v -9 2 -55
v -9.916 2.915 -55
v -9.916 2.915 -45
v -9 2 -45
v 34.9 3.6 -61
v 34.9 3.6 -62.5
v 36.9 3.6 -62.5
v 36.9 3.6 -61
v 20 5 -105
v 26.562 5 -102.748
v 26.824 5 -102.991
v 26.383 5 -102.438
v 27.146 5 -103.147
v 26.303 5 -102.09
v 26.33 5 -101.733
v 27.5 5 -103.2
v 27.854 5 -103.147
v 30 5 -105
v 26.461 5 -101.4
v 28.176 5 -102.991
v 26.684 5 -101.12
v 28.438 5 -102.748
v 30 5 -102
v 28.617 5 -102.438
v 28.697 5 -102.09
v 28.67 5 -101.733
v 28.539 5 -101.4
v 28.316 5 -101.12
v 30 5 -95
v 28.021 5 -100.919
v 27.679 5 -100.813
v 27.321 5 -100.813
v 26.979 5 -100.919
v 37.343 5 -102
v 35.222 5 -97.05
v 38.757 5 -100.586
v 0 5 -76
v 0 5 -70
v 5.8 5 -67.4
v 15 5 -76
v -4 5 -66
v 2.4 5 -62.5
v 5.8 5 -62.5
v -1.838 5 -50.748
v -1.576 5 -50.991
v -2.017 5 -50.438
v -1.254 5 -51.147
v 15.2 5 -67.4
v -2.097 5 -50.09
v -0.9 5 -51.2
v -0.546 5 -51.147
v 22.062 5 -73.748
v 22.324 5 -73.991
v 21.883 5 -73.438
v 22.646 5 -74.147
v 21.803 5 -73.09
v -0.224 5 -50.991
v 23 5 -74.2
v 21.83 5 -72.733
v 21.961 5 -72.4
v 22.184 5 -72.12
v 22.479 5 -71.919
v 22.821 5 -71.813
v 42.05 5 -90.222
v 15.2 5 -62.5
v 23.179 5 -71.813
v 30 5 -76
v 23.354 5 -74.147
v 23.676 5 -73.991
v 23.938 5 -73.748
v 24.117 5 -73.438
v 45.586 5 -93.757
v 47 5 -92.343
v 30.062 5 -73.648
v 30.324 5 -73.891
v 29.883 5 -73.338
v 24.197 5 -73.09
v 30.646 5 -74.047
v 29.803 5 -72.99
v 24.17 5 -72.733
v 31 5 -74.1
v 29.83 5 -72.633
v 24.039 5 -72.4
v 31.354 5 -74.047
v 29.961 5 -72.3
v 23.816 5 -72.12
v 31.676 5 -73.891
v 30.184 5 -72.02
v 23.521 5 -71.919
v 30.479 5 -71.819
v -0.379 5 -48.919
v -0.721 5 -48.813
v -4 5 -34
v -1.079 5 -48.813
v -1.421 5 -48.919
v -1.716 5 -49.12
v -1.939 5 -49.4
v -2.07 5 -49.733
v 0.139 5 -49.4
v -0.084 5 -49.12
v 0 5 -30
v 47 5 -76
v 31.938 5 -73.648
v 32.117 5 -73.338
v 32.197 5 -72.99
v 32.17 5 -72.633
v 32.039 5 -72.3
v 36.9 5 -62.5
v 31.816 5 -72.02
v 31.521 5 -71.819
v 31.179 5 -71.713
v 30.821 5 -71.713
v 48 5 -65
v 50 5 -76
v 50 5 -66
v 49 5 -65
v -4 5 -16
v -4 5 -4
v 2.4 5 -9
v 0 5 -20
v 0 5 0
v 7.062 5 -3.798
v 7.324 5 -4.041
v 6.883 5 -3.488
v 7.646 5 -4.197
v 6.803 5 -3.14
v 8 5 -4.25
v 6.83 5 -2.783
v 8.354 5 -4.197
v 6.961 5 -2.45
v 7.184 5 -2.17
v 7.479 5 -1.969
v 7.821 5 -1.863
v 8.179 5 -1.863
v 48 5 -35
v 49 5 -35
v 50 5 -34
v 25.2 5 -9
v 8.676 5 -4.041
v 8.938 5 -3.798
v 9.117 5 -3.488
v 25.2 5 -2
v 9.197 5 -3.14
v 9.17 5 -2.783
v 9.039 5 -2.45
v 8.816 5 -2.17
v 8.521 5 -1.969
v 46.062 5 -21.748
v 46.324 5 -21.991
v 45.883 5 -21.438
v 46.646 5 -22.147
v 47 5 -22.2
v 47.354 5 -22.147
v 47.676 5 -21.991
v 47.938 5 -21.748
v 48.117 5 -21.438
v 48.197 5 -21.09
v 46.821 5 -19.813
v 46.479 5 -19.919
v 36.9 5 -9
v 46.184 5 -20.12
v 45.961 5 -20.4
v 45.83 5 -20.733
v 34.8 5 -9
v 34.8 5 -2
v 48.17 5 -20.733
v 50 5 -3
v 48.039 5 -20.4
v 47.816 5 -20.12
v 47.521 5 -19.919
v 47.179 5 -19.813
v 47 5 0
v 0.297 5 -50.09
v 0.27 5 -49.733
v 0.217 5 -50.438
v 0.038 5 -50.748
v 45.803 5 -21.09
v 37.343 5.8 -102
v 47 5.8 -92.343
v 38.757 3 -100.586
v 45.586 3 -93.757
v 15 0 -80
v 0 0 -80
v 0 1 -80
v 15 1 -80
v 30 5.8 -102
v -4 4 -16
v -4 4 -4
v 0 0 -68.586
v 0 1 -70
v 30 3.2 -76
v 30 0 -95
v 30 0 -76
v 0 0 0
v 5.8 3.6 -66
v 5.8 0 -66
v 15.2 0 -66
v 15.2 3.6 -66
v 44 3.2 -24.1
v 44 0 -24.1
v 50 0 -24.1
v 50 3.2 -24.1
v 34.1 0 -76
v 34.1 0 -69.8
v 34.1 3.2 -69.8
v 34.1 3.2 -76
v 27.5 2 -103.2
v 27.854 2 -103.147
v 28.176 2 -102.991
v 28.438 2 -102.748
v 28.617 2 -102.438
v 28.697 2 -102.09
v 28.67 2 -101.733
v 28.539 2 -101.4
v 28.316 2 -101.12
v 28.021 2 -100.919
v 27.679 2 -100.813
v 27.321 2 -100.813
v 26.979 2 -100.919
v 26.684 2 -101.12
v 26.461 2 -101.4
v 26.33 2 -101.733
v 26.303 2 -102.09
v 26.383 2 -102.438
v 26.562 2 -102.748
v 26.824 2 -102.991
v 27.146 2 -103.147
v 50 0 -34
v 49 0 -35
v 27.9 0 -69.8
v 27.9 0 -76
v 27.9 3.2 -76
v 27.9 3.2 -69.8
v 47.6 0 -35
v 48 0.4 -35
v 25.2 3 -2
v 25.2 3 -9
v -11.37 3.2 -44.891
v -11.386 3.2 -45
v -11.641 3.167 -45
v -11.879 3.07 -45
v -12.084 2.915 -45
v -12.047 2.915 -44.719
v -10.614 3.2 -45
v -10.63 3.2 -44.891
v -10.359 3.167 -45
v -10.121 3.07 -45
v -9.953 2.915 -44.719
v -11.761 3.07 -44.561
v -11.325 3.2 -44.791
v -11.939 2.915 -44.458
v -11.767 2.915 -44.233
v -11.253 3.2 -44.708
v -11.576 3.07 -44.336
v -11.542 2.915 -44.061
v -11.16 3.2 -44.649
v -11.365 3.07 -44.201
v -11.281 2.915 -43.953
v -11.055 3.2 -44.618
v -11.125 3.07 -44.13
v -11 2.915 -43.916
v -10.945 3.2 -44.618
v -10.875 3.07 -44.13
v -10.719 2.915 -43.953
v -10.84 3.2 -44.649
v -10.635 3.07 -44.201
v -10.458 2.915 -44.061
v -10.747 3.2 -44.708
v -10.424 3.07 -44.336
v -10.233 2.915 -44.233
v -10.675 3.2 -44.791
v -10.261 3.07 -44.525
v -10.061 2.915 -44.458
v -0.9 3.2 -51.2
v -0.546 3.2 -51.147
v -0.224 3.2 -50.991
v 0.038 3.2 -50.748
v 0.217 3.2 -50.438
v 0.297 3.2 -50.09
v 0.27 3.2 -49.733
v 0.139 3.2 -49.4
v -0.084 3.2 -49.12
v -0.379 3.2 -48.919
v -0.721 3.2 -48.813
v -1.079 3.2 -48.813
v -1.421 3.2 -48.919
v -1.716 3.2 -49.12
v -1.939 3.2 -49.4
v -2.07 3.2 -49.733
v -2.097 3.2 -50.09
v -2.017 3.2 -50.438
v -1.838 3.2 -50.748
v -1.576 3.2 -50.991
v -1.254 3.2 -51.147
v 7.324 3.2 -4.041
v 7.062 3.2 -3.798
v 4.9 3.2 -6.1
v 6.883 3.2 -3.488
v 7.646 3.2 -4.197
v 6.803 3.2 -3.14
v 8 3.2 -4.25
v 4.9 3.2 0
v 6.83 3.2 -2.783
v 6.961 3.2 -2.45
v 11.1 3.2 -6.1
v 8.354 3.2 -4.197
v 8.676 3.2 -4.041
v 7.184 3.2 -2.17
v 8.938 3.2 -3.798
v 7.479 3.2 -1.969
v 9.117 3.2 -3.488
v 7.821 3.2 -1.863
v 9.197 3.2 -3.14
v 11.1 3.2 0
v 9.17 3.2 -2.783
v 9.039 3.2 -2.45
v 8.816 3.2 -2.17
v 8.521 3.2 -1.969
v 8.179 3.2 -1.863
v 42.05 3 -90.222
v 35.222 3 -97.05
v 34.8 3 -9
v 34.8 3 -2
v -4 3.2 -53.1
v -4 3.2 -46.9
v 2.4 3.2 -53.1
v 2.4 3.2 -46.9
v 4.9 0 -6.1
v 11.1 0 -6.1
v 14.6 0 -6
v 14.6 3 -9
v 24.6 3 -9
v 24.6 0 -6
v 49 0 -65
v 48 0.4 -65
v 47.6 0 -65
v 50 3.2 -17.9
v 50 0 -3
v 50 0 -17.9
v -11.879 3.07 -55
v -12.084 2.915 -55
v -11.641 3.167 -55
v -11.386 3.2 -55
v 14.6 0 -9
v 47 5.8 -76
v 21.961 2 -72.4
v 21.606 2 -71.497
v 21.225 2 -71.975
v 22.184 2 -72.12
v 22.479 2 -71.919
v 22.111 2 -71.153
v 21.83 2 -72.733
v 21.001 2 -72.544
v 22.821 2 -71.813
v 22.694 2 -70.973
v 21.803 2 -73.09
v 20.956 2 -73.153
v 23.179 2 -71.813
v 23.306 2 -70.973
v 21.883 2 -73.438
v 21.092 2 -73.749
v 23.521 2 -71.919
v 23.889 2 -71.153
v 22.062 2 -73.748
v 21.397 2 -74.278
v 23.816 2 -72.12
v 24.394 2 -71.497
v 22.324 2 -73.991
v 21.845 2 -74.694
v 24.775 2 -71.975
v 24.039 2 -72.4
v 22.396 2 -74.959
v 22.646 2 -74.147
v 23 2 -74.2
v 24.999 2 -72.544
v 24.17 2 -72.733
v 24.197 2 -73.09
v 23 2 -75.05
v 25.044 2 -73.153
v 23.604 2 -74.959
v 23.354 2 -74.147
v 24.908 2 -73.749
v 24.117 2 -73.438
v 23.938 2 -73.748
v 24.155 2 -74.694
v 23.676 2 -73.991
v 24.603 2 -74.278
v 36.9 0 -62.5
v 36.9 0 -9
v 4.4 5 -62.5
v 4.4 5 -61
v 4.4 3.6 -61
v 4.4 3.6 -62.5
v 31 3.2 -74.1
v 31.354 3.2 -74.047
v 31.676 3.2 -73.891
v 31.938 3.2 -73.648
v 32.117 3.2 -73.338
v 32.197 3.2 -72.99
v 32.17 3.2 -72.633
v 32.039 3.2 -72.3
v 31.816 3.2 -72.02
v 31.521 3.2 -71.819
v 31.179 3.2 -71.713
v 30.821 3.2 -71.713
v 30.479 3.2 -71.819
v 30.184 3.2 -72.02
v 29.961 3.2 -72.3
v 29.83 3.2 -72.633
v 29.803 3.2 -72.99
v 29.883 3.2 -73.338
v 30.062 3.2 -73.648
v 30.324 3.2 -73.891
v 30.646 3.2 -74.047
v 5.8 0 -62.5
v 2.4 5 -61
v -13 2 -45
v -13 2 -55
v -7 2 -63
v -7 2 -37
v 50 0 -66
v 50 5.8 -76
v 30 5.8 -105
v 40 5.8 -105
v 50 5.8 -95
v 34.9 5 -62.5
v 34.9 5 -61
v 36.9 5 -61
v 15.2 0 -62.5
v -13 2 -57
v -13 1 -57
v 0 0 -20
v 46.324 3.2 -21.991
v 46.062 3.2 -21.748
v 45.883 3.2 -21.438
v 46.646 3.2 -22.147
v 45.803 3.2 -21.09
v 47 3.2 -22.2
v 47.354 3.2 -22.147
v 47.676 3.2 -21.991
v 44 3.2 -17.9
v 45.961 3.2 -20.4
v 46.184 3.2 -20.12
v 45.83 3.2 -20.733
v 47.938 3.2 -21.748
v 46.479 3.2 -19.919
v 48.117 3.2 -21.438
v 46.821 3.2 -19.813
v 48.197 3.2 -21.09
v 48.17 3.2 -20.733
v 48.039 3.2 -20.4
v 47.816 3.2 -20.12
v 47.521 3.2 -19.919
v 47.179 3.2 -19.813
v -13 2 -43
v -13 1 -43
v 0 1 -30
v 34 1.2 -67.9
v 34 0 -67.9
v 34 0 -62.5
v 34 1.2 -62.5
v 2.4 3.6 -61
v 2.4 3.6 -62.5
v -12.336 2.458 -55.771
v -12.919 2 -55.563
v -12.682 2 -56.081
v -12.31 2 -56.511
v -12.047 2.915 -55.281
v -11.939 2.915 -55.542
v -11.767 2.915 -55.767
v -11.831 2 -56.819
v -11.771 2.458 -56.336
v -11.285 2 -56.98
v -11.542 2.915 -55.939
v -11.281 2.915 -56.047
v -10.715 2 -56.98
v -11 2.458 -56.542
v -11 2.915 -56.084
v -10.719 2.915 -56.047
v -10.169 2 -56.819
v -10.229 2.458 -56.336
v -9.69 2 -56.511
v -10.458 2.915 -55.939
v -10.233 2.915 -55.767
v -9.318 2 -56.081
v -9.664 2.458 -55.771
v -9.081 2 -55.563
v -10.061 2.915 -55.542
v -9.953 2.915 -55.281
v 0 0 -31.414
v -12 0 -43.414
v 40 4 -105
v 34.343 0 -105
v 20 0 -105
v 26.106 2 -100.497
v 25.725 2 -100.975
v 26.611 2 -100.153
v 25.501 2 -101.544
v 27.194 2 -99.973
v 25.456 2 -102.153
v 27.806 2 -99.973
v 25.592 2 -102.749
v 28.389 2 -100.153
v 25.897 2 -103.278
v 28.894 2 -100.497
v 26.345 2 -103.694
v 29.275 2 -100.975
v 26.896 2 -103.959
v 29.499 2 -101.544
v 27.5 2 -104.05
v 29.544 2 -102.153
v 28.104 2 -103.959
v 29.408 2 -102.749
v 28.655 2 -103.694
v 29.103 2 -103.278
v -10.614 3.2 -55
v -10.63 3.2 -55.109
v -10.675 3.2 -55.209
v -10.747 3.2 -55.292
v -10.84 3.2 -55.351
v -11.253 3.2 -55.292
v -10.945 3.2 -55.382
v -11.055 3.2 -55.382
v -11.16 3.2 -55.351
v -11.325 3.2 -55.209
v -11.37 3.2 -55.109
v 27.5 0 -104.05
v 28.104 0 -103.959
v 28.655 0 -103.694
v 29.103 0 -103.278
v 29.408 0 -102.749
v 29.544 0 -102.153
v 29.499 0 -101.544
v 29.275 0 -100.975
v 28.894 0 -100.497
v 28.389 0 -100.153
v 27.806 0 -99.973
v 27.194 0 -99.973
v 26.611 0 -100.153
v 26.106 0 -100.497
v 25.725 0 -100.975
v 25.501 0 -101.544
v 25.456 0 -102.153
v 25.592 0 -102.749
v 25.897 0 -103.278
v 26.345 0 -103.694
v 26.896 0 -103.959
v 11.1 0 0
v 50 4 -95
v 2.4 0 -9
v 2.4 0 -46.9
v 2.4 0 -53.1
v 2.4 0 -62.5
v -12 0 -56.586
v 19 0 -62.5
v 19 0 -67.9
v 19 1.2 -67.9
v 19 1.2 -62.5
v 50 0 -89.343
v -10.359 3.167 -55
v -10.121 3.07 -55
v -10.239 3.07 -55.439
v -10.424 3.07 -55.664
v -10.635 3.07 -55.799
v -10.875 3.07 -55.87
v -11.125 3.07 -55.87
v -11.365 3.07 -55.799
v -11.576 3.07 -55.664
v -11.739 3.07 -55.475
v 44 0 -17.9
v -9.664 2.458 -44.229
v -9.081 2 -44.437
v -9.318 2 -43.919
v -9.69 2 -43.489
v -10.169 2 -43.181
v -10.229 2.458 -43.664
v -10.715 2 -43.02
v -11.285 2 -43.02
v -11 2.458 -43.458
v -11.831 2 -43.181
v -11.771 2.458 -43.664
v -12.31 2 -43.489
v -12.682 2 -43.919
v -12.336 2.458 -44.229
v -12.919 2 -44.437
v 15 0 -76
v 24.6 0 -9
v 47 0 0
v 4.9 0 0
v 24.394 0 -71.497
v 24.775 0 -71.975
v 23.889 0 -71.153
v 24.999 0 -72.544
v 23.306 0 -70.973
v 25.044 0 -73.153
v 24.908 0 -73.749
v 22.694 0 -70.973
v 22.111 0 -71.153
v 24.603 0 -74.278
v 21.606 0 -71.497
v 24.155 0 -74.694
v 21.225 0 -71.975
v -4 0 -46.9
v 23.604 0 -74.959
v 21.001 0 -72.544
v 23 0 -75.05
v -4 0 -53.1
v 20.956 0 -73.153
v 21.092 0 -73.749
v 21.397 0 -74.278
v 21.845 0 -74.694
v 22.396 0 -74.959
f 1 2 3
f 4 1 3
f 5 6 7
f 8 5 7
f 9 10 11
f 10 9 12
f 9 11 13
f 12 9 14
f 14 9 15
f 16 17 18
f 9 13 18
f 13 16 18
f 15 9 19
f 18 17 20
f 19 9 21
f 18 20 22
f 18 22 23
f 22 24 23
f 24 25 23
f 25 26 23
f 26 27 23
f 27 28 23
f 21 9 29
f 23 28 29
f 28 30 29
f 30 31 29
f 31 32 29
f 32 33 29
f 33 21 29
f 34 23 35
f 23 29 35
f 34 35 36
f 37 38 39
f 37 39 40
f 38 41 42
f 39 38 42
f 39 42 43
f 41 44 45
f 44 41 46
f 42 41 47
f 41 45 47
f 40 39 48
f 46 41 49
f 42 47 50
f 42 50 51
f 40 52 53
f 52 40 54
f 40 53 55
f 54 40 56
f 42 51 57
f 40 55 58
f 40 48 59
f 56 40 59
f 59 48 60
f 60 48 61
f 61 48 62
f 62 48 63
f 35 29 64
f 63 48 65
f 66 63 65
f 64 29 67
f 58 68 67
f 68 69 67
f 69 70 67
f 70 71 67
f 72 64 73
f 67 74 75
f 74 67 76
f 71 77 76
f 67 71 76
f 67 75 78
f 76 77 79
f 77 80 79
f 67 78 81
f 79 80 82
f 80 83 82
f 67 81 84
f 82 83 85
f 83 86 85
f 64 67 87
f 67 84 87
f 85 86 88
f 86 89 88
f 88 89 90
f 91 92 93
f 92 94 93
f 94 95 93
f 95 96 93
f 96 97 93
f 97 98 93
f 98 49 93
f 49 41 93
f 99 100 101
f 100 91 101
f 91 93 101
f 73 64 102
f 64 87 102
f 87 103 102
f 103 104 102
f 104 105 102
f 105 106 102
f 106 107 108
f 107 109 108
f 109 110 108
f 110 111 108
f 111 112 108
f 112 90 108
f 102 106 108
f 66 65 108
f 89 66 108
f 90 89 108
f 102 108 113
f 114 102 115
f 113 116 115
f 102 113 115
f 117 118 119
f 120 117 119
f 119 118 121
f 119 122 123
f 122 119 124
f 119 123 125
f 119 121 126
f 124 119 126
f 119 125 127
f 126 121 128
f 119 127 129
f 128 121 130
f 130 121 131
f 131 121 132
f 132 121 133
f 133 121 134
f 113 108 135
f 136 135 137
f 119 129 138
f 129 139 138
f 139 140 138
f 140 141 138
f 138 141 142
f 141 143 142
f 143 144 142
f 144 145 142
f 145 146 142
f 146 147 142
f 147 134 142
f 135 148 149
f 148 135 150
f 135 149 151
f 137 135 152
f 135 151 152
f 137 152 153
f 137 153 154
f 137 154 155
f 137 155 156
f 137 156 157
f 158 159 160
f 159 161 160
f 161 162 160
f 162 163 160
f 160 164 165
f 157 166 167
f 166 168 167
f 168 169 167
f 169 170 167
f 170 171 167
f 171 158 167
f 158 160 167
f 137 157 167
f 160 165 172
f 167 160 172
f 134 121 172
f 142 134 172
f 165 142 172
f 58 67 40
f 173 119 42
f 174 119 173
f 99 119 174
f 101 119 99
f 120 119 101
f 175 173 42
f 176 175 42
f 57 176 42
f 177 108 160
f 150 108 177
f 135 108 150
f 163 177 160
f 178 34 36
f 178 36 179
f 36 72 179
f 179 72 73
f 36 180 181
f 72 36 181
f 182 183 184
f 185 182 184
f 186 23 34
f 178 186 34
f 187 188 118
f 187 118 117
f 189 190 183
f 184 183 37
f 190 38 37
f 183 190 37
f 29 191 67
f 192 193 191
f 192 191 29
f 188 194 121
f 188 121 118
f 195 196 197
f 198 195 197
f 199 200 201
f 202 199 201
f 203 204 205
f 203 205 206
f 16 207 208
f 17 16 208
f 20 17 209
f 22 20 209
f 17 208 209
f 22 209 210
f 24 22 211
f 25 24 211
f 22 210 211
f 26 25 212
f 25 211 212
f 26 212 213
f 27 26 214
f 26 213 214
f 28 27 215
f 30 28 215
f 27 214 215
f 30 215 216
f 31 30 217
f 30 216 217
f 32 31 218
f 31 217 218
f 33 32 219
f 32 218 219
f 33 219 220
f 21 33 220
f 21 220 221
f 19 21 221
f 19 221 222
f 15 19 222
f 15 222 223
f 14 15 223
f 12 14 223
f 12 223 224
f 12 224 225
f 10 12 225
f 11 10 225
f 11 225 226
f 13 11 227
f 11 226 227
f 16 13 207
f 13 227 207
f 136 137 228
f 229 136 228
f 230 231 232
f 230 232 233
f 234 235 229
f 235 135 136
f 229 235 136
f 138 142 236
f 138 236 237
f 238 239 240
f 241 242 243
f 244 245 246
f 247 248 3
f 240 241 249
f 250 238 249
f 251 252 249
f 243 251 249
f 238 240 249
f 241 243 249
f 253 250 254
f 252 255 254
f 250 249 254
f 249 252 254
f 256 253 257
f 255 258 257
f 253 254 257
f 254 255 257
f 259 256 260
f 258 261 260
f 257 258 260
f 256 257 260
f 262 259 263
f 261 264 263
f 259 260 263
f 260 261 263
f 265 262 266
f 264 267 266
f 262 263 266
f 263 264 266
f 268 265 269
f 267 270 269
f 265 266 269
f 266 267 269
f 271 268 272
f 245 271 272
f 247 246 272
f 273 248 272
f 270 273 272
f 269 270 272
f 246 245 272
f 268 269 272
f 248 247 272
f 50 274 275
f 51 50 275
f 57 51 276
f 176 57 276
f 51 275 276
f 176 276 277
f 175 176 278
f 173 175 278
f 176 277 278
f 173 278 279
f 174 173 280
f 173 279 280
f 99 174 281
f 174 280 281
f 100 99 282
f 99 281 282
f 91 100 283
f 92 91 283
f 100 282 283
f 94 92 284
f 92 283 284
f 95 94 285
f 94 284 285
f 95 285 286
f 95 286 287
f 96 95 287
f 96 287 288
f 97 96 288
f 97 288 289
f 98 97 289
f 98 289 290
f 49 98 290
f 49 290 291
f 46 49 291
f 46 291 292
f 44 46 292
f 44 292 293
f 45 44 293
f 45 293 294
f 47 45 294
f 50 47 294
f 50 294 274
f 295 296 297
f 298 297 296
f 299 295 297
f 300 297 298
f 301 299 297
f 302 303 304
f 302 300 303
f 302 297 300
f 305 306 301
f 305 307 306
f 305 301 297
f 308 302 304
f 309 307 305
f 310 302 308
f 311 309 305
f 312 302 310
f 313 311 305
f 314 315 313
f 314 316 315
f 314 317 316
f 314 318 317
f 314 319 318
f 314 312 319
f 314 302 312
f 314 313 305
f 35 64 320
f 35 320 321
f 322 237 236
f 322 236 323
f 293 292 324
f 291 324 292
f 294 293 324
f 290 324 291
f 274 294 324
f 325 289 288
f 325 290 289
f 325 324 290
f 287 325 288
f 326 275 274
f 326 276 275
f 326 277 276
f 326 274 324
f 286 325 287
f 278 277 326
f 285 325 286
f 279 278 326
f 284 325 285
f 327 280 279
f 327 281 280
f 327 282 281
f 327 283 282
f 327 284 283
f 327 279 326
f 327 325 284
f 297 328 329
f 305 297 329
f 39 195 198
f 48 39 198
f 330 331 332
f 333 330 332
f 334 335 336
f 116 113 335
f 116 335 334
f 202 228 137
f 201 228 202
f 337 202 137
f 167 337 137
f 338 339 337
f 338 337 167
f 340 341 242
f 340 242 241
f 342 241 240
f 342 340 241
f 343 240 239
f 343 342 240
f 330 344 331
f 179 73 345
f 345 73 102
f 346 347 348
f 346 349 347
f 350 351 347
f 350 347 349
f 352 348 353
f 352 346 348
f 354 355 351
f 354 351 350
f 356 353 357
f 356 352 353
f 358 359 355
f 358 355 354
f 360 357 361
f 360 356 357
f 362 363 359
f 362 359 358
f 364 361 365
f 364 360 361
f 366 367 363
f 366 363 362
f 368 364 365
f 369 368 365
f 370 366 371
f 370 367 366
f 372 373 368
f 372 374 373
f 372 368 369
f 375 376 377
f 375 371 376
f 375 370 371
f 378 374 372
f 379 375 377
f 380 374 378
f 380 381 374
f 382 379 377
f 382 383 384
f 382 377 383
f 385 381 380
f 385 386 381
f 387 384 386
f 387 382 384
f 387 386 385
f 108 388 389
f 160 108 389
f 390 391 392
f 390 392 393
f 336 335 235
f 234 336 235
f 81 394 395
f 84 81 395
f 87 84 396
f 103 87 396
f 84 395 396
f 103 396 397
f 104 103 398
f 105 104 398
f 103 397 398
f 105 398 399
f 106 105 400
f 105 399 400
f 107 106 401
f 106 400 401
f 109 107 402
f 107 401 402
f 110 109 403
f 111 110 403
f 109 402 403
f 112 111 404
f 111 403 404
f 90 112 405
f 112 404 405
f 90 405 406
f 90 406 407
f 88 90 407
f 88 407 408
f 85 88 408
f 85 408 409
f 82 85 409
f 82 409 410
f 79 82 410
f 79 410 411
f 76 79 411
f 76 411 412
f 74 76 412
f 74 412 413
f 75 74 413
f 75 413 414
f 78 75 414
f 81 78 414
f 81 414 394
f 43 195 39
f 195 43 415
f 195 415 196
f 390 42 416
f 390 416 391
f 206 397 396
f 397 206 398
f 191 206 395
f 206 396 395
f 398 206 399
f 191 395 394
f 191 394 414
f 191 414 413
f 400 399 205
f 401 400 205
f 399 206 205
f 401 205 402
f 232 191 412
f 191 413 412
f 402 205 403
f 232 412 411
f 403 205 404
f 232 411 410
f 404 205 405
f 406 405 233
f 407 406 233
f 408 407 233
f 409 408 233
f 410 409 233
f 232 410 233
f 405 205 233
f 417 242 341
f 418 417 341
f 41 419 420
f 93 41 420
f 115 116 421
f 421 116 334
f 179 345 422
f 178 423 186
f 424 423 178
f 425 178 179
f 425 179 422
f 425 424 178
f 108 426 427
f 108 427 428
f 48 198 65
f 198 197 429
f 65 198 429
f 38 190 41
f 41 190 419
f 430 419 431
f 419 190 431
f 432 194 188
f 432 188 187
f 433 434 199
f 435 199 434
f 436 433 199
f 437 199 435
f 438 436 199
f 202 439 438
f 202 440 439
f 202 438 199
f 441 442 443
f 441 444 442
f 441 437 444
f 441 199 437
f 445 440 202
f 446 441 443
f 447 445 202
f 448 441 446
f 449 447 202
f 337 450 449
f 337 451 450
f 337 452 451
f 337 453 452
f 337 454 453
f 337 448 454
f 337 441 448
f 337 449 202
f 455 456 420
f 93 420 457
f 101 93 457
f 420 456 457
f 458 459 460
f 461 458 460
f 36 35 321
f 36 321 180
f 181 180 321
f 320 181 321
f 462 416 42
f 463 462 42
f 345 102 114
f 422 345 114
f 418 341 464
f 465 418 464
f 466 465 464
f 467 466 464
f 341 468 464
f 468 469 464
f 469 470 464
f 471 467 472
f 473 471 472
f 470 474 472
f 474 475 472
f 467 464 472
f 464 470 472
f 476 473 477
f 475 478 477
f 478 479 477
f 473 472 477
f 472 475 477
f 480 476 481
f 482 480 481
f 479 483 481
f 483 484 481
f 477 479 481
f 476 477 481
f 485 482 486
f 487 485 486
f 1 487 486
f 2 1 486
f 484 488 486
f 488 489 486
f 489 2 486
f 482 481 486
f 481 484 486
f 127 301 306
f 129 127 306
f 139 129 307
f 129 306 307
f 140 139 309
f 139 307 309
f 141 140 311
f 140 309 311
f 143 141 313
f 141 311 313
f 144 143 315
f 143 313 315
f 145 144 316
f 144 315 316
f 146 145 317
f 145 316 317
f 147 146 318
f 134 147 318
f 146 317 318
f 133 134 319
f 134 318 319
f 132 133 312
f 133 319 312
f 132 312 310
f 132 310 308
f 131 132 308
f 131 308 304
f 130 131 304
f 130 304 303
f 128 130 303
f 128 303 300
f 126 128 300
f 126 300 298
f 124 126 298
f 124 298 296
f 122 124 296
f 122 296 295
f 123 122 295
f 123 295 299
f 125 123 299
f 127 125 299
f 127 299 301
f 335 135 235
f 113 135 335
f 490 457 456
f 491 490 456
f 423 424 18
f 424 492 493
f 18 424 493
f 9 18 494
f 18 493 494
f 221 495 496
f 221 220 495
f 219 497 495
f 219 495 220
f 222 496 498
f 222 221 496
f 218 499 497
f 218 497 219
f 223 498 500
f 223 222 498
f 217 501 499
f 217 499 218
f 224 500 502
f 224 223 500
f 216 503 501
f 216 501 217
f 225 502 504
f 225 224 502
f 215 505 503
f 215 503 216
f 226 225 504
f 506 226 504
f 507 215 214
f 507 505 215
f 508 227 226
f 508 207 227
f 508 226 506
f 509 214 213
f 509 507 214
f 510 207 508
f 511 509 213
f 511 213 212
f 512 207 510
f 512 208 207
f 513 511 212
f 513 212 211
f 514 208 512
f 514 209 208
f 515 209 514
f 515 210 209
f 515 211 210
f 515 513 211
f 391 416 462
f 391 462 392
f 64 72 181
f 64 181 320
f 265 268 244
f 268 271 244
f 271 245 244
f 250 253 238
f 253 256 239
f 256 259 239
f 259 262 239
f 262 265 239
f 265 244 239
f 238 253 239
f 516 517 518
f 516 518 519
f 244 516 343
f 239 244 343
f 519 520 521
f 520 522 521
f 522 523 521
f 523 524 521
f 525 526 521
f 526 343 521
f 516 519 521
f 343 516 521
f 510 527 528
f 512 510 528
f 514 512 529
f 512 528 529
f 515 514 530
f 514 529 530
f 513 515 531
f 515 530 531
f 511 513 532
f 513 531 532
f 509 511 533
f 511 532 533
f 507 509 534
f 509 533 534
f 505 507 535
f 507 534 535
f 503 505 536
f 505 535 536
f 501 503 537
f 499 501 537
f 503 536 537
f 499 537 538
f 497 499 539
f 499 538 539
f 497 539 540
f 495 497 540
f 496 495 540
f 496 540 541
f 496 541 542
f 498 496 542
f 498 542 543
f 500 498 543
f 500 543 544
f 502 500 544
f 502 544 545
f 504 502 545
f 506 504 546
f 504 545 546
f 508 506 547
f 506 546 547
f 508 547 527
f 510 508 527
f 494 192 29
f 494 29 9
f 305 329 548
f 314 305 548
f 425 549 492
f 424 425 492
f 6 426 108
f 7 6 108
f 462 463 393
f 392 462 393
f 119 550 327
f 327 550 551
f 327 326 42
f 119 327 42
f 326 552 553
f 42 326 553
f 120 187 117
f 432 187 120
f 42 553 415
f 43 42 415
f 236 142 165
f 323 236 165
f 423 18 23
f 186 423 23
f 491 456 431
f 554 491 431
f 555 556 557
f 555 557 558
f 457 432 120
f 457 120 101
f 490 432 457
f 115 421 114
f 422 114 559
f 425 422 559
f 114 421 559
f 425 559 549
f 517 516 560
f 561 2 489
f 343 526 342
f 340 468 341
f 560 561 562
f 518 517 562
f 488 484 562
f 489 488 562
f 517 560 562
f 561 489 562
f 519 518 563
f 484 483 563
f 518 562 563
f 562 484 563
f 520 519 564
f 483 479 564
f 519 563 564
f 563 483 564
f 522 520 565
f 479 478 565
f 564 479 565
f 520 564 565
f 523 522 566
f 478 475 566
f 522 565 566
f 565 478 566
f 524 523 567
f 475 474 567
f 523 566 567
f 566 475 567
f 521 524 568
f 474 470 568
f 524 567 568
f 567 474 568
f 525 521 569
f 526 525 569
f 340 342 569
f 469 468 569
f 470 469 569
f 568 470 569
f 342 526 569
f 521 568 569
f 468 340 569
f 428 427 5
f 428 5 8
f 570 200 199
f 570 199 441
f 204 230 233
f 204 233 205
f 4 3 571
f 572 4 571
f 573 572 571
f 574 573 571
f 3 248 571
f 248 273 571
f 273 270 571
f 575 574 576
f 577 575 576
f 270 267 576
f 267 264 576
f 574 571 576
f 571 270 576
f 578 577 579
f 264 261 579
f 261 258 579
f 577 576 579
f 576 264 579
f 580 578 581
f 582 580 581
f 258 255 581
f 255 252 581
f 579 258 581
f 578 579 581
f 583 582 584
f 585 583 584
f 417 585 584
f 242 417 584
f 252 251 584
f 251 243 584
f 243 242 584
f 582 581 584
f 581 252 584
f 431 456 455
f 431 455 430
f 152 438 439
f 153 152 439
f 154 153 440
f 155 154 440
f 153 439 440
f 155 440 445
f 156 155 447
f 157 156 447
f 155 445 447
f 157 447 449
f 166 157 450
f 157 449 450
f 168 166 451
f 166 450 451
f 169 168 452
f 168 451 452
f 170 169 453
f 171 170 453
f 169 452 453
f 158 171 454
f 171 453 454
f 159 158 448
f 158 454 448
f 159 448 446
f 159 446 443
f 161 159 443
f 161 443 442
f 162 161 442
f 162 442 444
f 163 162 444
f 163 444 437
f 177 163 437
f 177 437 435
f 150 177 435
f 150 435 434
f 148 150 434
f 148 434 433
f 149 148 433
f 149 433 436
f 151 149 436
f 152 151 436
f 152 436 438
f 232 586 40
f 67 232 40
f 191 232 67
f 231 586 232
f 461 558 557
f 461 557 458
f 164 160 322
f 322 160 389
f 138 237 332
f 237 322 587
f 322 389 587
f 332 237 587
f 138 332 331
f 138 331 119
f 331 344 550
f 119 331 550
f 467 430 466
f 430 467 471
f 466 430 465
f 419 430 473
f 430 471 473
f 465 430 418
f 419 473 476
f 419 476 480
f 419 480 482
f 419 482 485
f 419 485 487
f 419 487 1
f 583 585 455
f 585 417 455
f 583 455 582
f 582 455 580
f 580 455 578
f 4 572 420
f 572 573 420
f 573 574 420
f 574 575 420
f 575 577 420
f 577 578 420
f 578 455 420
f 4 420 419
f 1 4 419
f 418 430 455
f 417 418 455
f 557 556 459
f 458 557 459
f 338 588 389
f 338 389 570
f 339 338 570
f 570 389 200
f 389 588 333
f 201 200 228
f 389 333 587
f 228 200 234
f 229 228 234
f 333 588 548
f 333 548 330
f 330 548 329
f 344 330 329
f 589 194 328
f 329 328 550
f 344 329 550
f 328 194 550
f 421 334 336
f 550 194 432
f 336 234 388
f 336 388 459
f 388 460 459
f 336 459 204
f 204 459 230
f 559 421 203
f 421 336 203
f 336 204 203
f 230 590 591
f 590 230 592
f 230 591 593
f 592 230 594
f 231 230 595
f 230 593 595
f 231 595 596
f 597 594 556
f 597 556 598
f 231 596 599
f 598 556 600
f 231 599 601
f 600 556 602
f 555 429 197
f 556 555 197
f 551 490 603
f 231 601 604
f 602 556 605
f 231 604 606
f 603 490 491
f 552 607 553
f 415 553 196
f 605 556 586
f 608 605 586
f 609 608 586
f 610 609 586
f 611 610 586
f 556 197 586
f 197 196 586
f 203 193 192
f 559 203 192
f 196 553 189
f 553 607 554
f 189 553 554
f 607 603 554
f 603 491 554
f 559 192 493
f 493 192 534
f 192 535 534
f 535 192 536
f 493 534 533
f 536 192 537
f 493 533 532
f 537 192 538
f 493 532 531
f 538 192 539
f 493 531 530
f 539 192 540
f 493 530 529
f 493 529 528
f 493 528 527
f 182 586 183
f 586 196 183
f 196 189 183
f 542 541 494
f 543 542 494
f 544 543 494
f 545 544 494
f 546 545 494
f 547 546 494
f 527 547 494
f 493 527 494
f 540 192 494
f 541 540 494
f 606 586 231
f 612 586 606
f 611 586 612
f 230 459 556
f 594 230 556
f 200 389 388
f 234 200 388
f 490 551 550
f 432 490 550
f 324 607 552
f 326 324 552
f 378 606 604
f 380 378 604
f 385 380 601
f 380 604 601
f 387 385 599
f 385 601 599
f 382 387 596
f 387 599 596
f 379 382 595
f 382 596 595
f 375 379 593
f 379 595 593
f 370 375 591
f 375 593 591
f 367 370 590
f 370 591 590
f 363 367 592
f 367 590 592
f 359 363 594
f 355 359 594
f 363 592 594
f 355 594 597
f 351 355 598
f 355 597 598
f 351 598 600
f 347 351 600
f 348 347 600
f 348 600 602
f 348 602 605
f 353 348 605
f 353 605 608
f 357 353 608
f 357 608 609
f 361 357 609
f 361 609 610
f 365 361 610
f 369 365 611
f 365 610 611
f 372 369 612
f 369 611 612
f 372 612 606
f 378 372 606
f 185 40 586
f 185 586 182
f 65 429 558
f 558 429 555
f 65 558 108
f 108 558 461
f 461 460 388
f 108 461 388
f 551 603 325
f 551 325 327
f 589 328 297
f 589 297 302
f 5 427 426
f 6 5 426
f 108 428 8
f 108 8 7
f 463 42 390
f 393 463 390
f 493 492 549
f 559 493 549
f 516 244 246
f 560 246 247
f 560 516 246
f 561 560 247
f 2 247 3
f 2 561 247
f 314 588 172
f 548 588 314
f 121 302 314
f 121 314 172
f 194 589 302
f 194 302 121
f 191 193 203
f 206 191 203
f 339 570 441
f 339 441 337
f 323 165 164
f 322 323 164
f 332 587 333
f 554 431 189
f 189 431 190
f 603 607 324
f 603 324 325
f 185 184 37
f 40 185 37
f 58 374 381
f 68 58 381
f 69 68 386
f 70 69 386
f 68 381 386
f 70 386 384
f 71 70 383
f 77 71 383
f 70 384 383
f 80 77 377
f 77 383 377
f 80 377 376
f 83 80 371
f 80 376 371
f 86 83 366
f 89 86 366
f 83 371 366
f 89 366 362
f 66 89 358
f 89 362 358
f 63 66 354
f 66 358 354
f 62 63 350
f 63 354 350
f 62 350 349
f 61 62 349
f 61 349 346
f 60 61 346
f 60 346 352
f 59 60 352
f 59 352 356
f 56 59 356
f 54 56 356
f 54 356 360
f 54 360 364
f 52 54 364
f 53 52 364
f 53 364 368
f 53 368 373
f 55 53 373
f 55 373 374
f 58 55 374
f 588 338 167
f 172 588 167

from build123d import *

# Parameters (mm, degrees)
EXTRUDE_1_DEPTH      = 5
CUT_EXTRUDE_1_DEPTH  = 5
CHAMFER_1_SIZE       = 1.4
SKETCH_3_W           = 2
SKETCH_3_H           = 1.5
EXTRUDE_2_DEPTH      = 1.4
EXTRUDE_2_2_DEPTH    = 1.4
CHAMFER_2_SIZE       = 4
EXTRUDE_4_DEPTH      = 2
EXTRUDE_5_DEPTH      = 3
CHAMFER_4_SIZE       = 3
EXTRUDE_6_DEPTH      = 5
CHAMFER_5_SIZE       = 4
SKETCH_9_R           = 2.05
CUT_EXTRUDE_2_DEPTH  = 2
SKETCH_10_R          = 1.2
CUT_EXTRUDE_3_DEPTH  = 3
CHAMFER_6_SIZE       = 1
CHAMFER_7_SIZE       = 3
SKETCH_11_W          = 2
SKETCH_11_H          = 30
CUT_EXTRUDE_4_DEPTH  = 117.404467268
SKETCH_12_W          = 6
SKETCH_12_H          = 6.2
SKETCH_12_W_2        = 6.2
SKETCH_12_H_2        = 6.1
SKETCH_12_W_3        = 6.4
CUT_EXTRUDE_5_DEPTH  = 3.2
SKETCH_12_4_R        = 1.2
CUT_EXTRUDE_6_DEPTH  = 117.404467268
SKETCH_13_W          = 9.6
SKETCH_13_H          = 7
CUT_EXTRUDE_7_DEPTH  = 2
SKETCH_14_W          = 10
SKETCH_14_H          = 3
CUT_EXTRUDE_8_DEPTH  = 3
CHAMFER_8_SIZE       = 3
EXTRUDE_7_DEPTH      = 15
CHAMFER_9_SIZE       = 1
SKETCH_16_W          = 15
SKETCH_16_H          = 5.4
CUT_EXTRUDE_9_DEPTH  = 1.2
EXTRUDE_8_DEPTH      = 1.2
CHAMFER_10_SIZE      = 1.2
FILLET_START         = -55.913222165
FILLET_1_DEPTH       = 11.82644433
FILLET_1_2_ANGLE     = 180
FILLET_1_3_ANGLE     = 180
SKETCH_18_R          = 1.2
CUT_EXTRUDE_10_DEPTH = 117.404467268
SKETCH_18_3_R        = 2.05
CUT_EXTRUDE_11_DEPTH = 2
EXTRUDE_3_DEPTH      = 0.8
CUT_EXTRUDE_12_DEPTH = 2
CHAMFER_11_SIZE      = 0.4


with BuildPart() as part:
    # 草图1 → 凸台-拉伸1 (new body)
    with BuildSketch(Plane(origin=(0, 0, 0), x_dir=(1, 0, 0), z_dir=(0, 1, 0))):
        Polygon((40, 105), (50, 95), (50, 0), (0, 0), (0, 76), (30, 76), (30, 95), (20, 105), align=None)
    extrude(amount=EXTRUDE_1_DEPTH)

    # 草图2 → 切除-拉伸1 (cut)
    with BuildSketch(Plane.XZ):
        Polygon((15.2, -62.5), (36.9, -62.5), (36.9, -9), (2.4, -9), (2.4, -62.5), (5.8, -62.5), (5.8, -66), (15.2, -66), align=None)
    extrude(amount=-CUT_EXTRUDE_1_DEPTH, mode=Mode.SUBTRACT)

    # 倒角1
    chamfer_1_edges = [part.edges().sort_by_distance(p)[0] for p in [
        (10.5, 5, -66),
    ]]
    chamfer(chamfer_1_edges, length=CHAMFER_1_SIZE)

    # 倒角2
    chamfer_2_edges = [part.edges().sort_by_distance(p)[0] for p in [
        (45, 0, -100),
    ]]
    chamfer(chamfer_2_edges, length=CHAMFER_2_SIZE)

    # 草图6 → 凸台-拉伸4 (add)
    with BuildSketch(Plane.XZ):
        Polygon((0, -70), (0, -30), (-13, -43), (-13, -57), align=None)
    extrude(amount=-EXTRUDE_4_DEPTH)

    # 草图7 → 凸台-拉伸5 (add)
    with BuildSketch(Plane(origin=(0, 2, 0), x_dir=(1, 0, 0), z_dir=(0, 1, 0))):
        Polygon((-4, 66), (-4, 34), (0, 30), (0, 70), align=None)
    extrude(amount=EXTRUDE_5_DEPTH)

    # 倒角4
    chamfer_4_edges = [part.edges().sort_by_distance(p)[0] for p in [
        (-4, 2, -50),
    ]]
    chamfer(chamfer_4_edges, length=CHAMFER_4_SIZE - 0.0001)  # a hair under: the kernel refuses the full size

    # 草图8 → 凸台-拉伸6 (add)
    with BuildSketch(Plane.XZ):
        Polygon((0, -20), (0, 0), (-4, -4), (-4, -16), align=None)
    extrude(amount=-EXTRUDE_6_DEPTH)

    # 倒角5
    chamfer_5_edges = [part.edges().sort_by_distance(p)[0] for p in [
        (-4, 0, -10),
    ]]
    chamfer(chamfer_5_edges, length=CHAMFER_5_SIZE)

    # 草图9 → 切除-拉伸2 (cut)
    with BuildSketch(Plane.XZ):
        with Locations(Location((27.5, -102, 0), (0, 0, 270))):
            Circle(SKETCH_9_R)
    extrude(amount=-CUT_EXTRUDE_2_DEPTH, mode=Mode.SUBTRACT)

    # 草图10 → 切除-拉伸3 (cut)
    with BuildSketch(Plane.XZ.offset(-2)):
        with Locations(Location((27.5, -102, 0), (0, 0, 270))):
            Circle(SKETCH_10_R)
    extrude(amount=-CUT_EXTRUDE_3_DEPTH, mode=Mode.SUBTRACT)

    # 倒角6
    chamfer_6_edges = [part.edges().sort_by_distance(p)[0] for p in [
        (-6.5, 0, -36.5),
        (-13, 0, -50),
        (-6.5, 0, -63.5),
    ]]
    chamfer(chamfer_6_edges, length=CHAMFER_6_SIZE)

    # 倒角7
    chamfer_7_edges = [part.edges().sort_by_distance(p)[0] for p in [
        (50, 2.5, 0),
    ]]
    chamfer(chamfer_7_edges, length=CHAMFER_7_SIZE)

    # 草图11 → 切除-拉伸4 (cut, through all)
    with BuildSketch(Plane(origin=(0, 5, 0), x_dir=(1, 0, 0), z_dir=(0, 1, 0))):
        with Locations((49, 50)):
            Rectangle(SKETCH_11_W, SKETCH_11_H)
    extrude(amount=-CUT_EXTRUDE_4_DEPTH, mode=Mode.SUBTRACT)

    # 草图12 → 切除-拉伸5 (cut)
    with BuildSketch(Plane.XZ):
        with Locations((47, -21)):
            Rectangle(SKETCH_12_W, SKETCH_12_H)
        with Locations((8, -3.05)):
            Rectangle(SKETCH_12_W_2, SKETCH_12_H_2)
        Polygon((27.9, -76), (27.9, -69.8), (34.1, -69.8), (34.1, -76), (30, -76), align=None)
        with Locations((-0.8, -50)):
            Rectangle(SKETCH_12_W_3, SKETCH_12_H)
    extrude(amount=-CUT_EXTRUDE_5_DEPTH, mode=Mode.SUBTRACT)

    # 草图12<4> → 切除-拉伸6 (cut, through all)
    with BuildSketch(Plane.XZ):
        with Locations(Location((8, -3.05, 0), (0, 0, 270))):
            Circle(SKETCH_12_4_R)
        with Locations(Location((47, -21, 0), (0, 0, 270))):
            Circle(SKETCH_12_4_R)
        with Locations(Location((31, -72.9, 0), (0, 0, 270))):
            Circle(SKETCH_12_4_R)
        with Locations(Location((-0.9, -50, 0), (0, 0, 270))):
            Circle(SKETCH_12_4_R)
    extrude(amount=-CUT_EXTRUDE_6_DEPTH, mode=Mode.SUBTRACT)

    # 草图13 → 切除-拉伸7 (cut)
    with BuildSketch(Plane(origin=(0, 5, 0), x_dir=(1, 0, 0), z_dir=(0, 1, 0))):
        with Locations((30.000080746, 5.5)):
            Rectangle(SKETCH_13_W, SKETCH_13_H)
    extrude(amount=-CUT_EXTRUDE_7_DEPTH, mode=Mode.SUBTRACT)

    # 草图14 → 切除-拉伸8 (cut)
    with BuildSketch(Plane.XZ):
        with Locations((19.6, -7.5)):
            Rectangle(SKETCH_14_W, SKETCH_14_H)
    extrude(amount=-CUT_EXTRUDE_8_DEPTH, mode=Mode.SUBTRACT)

    # 倒角8
    chamfer_8_edges = [part.edges().sort_by_distance(p)[0] for p in [
        (19.6, 3, -6),
    ]]
    chamfer(chamfer_8_edges, length=CHAMFER_8_SIZE - 0.0001)  # a hair under: the kernel refuses the full size

    # 草图15 → 凸台-拉伸7 (add)
    with BuildSketch(Plane.ZY):
        Polygon((-76, 5), (-76, 0), (-80, 0), (-80, 1), align=None)
    extrude(amount=-EXTRUDE_7_DEPTH)

    # 倒角9
    chamfer_9_edges = [part.edges().sort_by_distance(p)[0] for p in [
        (50, 2.5, -65),
        (50, 2.5, -35),
    ]]
    chamfer(chamfer_9_edges, length=CHAMFER_9_SIZE)

    # 草图16 → 切除-拉伸9 (cut)
    with BuildSketch(Plane.XZ):
        with Locations((26.5, -65.2)):
            Rectangle(SKETCH_16_W, SKETCH_16_H)
    extrude(amount=-CUT_EXTRUDE_9_DEPTH, mode=Mode.SUBTRACT)

    # 草图17 → 凸台-拉伸8 (add)
    with BuildSketch(Plane(origin=(0, 2, 0), x_dir=(1, 0, 0), z_dir=(0, 1, 0))):
        with BuildLine():
            Line((-10.2, 55), (-10.2, 45))
            ThreePointArc((-10.2, 45), (-11, 44.2), (-11.8, 45))
            Line((-11.8, 45), (-11.8, 55))
            ThreePointArc((-11.8, 55), (-11, 55.8), (-10.2, 55))
        make_face()
    extrude(amount=EXTRUDE_8_DEPTH)

    # 倒角10
    chamfer_10_edges = [part.edges().sort_by_distance(p)[0] for p in [
        (-10.2, 2, -50),
        (-11, 2, -55.8),
        (-11, 2, -44.2),
        (-11.8, 2, -50),
    ]]
    chamfer(chamfer_10_edges, length=CHAMFER_10_SIZE - 0.0001)  # a hair under: the kernel refuses the full size

    # 圆角1: read off the stored shape, not the designer's step
    # 圆角1 outline → 圆角1 (cut)
    with BuildSketch(Plane.XY.offset(FILLET_START)):
        with BuildLine():
            Line((-10.2, 3.2), (-10.614213562, 3.2))
            ThreePointArc((-10.614213562, 3.2), (-10.23153013, 3.123879533), (-9.907106781, 2.907106781))
            Line((-9.907106781, 2.907106781), (-10.2, 3.2))
        make_face()
        with BuildLine():
            ThreePointArc((-12.092893219, 2.907106781), (-11.76846987, 3.123879533), (-11.385786438, 3.2))
            Line((-11.385786438, 3.2), (-11.8, 3.2))
            Line((-11.8, 3.2), (-12.092893219, 2.907106781))
        make_face()
    extrude(amount=FILLET_1_DEPTH, mode=Mode.SUBTRACT)

    # Fillet 1 2 outline → Fillet 1 2 (revolve, cut)
    with BuildSketch(Plane(origin=(-11, 0, -45), x_dir=(-1, 0, 0), z_dir=(0, 0, -1))):
        with BuildLine():
            ThreePointArc((0.385786438, 3.2), (0.76846987, 3.123879533), (1.092893219, 2.907106781))
            Line((1.092893219, 2.907106781), (1.092893219, 3.2))
            Line((1.092893219, 3.2), (0.385786438, 3.2))
        make_face()
    revolve(axis=Axis((-11, 0, -45), (0, 1, 0)), revolution_arc=FILLET_1_2_ANGLE, mode=Mode.SUBTRACT)

    # Fillet 1 3 outline → Fillet 1 3 (revolve, cut)
    with BuildSketch(Plane(origin=(-11, 0, -55), x_dir=(1, 0, 0), z_dir=(0, 0, 1))):
        with BuildLine():
            ThreePointArc((0.385786438, 3.2), (0.76846987, 3.123879533), (1.092893219, 2.907106781))
            Line((1.092893219, 2.907106781), (1.092893219, 3.2))
            Line((1.092893219, 3.2), (0.385786438, 3.2))
        make_face()
    revolve(axis=Axis((-11, 0, -55), (0, 1, 0)), revolution_arc=FILLET_1_3_ANGLE, mode=Mode.SUBTRACT)

    # 草图18 → 切除-拉伸10 (cut, through all)
    with BuildSketch(Plane.XZ):
        with Locations(Location((23, -73, 0), (0, 0, 270))):
            Circle(SKETCH_18_R)
    extrude(amount=-CUT_EXTRUDE_10_DEPTH, mode=Mode.SUBTRACT)

    # 草图18<3> → 切除-拉伸11 (cut)
    with BuildSketch(Plane.XZ):
        with Locations(Location((23, -73, 0), (0, 0, 270))):
            Circle(SKETCH_18_3_R)
    extrude(amount=-CUT_EXTRUDE_11_DEPTH, mode=Mode.SUBTRACT)

    # 草图5 → 凸台-拉伸3 (add)
    with BuildSketch(Plane(origin=(0, 5, 0), x_dir=(1, 0, 0), z_dir=(0, 1, 0))):
        Polygon((40, 105), (30, 105), (30, 104.8), (30, 102), (37.343145751, 102), (47, 92.343145751), (47, 76), (50, 76), (50, 95), align=None)
    extrude(amount=EXTRUDE_3_DEPTH)

    # 草图19 → 切除-拉伸12 (cut)
    with BuildSketch(Plane(origin=(0, 5, 0), x_dir=(1, 0, 0), z_dir=(0, 1, 0))):
        Polygon((38.757359313, 100.585786438), (45.585786438, 93.757359313), (42.050252532, 90.221825407), (35.221825407, 97.050252532), align=None)
    extrude(amount=-CUT_EXTRUDE_12_DEPTH, mode=Mode.SUBTRACT)

    # 倒角11
    chamfer_11_edges = [part.edges().sort_by_distance(p)[0] for p in [
        (48, 0, -50),
    ]]
    chamfer(chamfer_11_edges, length=CHAMFER_11_SIZE)


with BuildPart() as body_2:
    # 草图3 → 凸台-拉伸2 (new body)
    with BuildSketch(Plane(origin=(0, 5, 0), x_dir=(1, 0, 0), z_dir=(0, 1, 0))):
        with Locations((3.4, 61.75)):
            Rectangle(SKETCH_3_W, SKETCH_3_H)
    extrude(amount=-EXTRUDE_2_DEPTH)


with BuildPart() as body_3:
    # 草图3 → Extrude 2 2 (new body)
    with BuildSketch(Plane(origin=(0, 5, 0), x_dir=(1, 0, 0), z_dir=(0, 1, 0))):
        with Locations((35.9, 61.75)):
            Rectangle(SKETCH_3_W, SKETCH_3_H)
    extrude(amount=-EXTRUDE_2_2_DEPTH)


solid = Compound([part.part, body_2.part, body_3.part])
